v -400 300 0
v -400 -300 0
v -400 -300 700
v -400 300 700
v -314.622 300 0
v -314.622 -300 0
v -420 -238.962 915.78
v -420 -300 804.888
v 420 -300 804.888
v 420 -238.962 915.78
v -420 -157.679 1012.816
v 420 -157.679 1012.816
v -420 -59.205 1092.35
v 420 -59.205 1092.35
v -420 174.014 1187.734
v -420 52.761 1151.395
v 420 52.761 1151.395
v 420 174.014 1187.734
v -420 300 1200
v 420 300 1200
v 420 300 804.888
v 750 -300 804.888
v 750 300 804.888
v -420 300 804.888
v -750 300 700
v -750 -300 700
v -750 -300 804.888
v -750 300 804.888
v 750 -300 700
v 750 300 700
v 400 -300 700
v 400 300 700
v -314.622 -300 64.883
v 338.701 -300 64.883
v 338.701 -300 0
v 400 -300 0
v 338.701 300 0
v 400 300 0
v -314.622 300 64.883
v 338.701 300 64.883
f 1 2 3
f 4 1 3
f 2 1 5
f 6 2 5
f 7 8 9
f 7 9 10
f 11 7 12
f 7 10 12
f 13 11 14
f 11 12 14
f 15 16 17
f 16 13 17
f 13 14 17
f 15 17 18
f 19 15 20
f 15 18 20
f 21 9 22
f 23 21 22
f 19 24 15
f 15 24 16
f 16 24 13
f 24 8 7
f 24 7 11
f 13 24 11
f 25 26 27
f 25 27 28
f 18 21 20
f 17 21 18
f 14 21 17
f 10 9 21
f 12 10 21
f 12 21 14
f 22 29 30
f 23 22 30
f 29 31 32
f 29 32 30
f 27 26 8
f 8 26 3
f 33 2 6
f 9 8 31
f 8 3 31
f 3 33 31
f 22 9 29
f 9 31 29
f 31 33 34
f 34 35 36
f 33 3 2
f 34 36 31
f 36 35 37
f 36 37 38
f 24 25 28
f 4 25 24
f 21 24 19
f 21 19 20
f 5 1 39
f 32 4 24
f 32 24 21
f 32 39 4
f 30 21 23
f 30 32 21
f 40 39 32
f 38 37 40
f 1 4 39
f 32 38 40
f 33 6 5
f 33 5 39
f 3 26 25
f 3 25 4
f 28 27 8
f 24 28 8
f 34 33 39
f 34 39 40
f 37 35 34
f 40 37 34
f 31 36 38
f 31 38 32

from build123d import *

# Parameters (mm, degrees)
F0_W     = 1500
F0_H     = 600
F1_DEPTH = 1200
F3_DEPTH = 1600
F4_W     = 350
F4_H     = 700
F5_DEPTH = 1500
F6_W     = 330
F6_H     = 420
F7_DEPTH = 2000
F8_W     = 653.322876
F8_H     = 64.883091
F9_DEPTH = 1500


with BuildPart() as f1:
    # F0 (on Top) → F1 (new body)
    with BuildSketch(Plane.XY):
        Rectangle(F0_W, F0_H)
    extrude(amount=F1_DEPTH)

    # F2 (on face) → F3 (cut)
    with BuildSketch(Plane.YZ.offset(750)):
        with BuildLine():
            ThreePointArc((-300, 804.887652), (-59.205292, 1092.350344), (300, 1200))
            Line((300, 1200), (-300, 1200))
            Line((-300, 1200), (-300, 804.887652))
        make_face()
    extrude(amount=-F3_DEPTH, mode=Mode.SUBTRACT)

    # F4 (on face) → F5 (cut)
    with BuildSketch(Plane.XZ.offset(300)):
        with Locations((-575, 350)):
            Rectangle(F4_W, F4_H)
        with Locations((575, 350)):
            Rectangle(F4_W, F4_H)
    extrude(amount=-F5_DEPTH, mode=Mode.SUBTRACT)

    # F6 (on face) → F7 (cut)
    with BuildSketch(Plane.XZ.offset(300)):
        with Locations((-585, 1014.887652)):
            Rectangle(F6_W, F6_H)
        with Locations((585, 1014.887652)):
            Rectangle(F6_W, F6_H)
    extrude(amount=-F7_DEPTH, mode=Mode.SUBTRACT)

    # F8 (on face) → F9 (cut)
    with BuildSketch(Plane.XZ.offset(300)):
        with Locations((12.039125, 32.441545)):
            Rectangle(F8_W, F8_H)
    extrude(amount=-F9_DEPTH, mode=Mode.SUBTRACT)


solid = f1.part
